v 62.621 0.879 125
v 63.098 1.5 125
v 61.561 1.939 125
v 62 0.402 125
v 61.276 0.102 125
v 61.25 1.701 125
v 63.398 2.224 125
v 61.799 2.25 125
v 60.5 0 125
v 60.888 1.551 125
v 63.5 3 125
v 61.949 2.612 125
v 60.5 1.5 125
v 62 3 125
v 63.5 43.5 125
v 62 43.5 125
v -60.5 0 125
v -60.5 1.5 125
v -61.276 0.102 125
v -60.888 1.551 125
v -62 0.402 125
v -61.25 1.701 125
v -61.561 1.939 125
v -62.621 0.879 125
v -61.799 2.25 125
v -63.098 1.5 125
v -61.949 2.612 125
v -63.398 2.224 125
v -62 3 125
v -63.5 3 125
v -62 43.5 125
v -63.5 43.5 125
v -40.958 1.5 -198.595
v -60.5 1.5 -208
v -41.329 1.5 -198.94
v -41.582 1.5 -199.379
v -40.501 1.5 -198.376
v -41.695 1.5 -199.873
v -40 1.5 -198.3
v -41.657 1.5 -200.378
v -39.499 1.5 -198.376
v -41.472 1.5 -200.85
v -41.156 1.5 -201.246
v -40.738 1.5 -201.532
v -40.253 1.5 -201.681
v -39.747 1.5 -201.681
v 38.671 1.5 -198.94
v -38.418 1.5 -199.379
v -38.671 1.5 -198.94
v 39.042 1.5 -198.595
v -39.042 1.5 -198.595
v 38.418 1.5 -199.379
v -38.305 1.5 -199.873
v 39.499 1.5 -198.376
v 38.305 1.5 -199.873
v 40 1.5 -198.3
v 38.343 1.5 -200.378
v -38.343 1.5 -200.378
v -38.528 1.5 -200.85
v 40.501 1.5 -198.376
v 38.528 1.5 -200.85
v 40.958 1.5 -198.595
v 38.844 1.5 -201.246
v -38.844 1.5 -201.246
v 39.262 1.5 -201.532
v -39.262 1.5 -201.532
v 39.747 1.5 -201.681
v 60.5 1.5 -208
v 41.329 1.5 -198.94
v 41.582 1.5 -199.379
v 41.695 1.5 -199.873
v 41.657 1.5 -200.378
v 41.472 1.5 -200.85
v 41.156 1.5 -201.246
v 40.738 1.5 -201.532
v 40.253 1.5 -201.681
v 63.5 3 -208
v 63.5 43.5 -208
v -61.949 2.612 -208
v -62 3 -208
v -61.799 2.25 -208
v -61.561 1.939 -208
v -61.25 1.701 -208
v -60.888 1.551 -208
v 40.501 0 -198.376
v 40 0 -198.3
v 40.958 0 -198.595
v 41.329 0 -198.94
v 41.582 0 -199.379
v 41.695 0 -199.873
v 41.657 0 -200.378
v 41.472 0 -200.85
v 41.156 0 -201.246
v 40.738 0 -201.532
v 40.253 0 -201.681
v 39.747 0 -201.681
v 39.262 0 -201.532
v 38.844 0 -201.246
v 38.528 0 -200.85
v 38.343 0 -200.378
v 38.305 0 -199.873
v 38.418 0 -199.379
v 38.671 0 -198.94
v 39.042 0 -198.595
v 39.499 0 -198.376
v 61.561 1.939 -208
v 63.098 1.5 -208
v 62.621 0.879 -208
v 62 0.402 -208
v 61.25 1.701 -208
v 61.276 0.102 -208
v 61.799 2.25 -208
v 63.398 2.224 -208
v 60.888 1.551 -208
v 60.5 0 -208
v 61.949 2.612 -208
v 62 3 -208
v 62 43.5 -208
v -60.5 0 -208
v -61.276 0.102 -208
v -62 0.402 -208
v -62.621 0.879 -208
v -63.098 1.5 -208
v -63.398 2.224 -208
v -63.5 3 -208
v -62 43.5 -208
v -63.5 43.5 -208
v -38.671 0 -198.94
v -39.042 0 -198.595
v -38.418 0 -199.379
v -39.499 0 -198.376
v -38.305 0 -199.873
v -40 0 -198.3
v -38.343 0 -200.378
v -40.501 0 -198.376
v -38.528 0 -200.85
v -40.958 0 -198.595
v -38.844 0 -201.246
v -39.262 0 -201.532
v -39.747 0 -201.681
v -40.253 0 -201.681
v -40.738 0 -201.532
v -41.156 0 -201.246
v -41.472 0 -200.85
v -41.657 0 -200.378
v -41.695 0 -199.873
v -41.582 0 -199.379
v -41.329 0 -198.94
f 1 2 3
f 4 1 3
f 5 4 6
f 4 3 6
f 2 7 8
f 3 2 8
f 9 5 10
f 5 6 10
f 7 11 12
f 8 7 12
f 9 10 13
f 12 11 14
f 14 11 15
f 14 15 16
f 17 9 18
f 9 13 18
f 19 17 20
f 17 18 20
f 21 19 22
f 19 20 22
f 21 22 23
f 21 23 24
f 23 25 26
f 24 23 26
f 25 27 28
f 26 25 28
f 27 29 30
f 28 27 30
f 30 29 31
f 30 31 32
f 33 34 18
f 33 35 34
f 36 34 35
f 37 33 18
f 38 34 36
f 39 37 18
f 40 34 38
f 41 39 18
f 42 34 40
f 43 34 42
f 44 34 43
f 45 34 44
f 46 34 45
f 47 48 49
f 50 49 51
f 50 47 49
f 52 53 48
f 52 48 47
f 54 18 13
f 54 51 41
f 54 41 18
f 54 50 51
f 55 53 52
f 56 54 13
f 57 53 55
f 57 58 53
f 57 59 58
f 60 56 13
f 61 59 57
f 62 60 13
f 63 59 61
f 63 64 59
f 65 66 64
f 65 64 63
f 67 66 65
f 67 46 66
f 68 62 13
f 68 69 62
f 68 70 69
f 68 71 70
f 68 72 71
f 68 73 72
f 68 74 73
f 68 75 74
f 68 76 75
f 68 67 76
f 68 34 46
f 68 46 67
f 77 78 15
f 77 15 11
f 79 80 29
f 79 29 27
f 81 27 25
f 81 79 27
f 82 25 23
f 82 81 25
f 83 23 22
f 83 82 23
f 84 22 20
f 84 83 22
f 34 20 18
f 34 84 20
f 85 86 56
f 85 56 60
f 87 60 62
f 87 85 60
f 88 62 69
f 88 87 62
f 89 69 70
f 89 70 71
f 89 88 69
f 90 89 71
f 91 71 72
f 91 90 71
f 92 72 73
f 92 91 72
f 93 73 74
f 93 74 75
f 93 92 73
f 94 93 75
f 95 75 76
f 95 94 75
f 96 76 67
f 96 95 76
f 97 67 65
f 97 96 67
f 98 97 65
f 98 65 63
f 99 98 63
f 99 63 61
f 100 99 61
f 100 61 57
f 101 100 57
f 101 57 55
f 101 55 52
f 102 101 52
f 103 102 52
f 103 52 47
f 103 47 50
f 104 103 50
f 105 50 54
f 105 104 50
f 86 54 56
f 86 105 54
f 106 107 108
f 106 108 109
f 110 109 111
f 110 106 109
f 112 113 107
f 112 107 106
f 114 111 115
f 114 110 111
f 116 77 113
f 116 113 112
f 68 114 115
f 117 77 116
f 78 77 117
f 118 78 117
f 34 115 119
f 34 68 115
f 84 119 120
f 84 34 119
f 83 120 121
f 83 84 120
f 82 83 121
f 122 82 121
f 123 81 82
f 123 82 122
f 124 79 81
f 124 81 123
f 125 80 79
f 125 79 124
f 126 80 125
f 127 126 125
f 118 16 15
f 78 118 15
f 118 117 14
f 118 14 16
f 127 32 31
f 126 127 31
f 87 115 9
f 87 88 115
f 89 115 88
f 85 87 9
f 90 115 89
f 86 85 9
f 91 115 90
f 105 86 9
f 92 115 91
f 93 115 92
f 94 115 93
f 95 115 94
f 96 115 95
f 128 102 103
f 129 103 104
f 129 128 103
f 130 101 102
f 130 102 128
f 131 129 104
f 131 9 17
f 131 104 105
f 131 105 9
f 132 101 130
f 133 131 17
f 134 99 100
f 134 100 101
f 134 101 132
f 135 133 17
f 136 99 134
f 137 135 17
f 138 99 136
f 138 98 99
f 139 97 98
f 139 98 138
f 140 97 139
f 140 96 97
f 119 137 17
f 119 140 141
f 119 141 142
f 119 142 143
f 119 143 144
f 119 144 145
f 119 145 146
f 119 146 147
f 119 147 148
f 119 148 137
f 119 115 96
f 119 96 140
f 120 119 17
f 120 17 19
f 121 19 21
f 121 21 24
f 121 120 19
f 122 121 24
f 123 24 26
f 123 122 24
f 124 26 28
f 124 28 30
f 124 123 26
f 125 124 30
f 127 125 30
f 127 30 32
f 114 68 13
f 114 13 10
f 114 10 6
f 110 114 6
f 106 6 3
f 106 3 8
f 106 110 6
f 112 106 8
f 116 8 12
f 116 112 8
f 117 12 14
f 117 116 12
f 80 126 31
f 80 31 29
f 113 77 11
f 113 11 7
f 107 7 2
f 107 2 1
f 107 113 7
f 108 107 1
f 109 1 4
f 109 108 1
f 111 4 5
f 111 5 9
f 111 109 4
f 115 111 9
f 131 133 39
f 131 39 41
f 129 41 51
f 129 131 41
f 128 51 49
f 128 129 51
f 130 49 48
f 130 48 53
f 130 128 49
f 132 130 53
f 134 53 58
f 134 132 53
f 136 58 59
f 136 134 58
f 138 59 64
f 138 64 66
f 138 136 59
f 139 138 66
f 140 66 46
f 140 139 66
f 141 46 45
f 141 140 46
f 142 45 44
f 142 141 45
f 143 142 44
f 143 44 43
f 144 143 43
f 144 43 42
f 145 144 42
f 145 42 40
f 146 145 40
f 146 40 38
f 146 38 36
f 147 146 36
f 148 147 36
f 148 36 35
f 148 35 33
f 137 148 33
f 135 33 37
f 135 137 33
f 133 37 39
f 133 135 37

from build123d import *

# Parameters (mm, degrees)
SM_TRAY_DEPTH       = 333
SK_FACEHOLES_R      = 1.7
CUT_FACEHOLES_DEPTH = 1.5


# Sheet-metal steps are written as plain solids
with BuildPart() as part:
    # SK_Tray → SM_Tray (new body)
    with BuildSketch(Plane.XY.offset(-208)):
        with BuildLine():
            Line((-62, 43.5), (-62, 3))
            ThreePointArc((-62, 3), (-61.560660172, 1.939339828), (-60.5, 1.5))
            Line((-60.5, 1.5), (60.5, 1.5))
            ThreePointArc((60.5, 1.5), (61.560660172, 1.939339828), (62, 3))
            Line((62, 3), (62, 43.5))
            Line((62, 43.5), (63.5, 43.5))
            Line((63.5, 43.5), (63.5, 3))
            ThreePointArc((63.5, 3), (62.621320344, 0.878679656), (60.5, 0))
            Line((60.5, 0), (-60.5, 0))
            ThreePointArc((-60.5, 0), (-62.621320344, 0.878679656), (-63.5, 3))
            Line((-63.5, 3), (-63.5, 43.5))
            Line((-63.5, 43.5), (-62, 43.5))
        make_face()
    extrude(amount=SM_TRAY_DEPTH)

    # SK_FaceHoles → CUT_FaceHoles (cut)
    with BuildSketch(Plane(origin=(0, 0, 0), x_dir=(1, 0, 0), z_dir=(0, 1, 0))):
        with Locations(Location((40, 200, 0), (0, 0, 270))):
            Circle(SK_FACEHOLES_R)
        with Locations(Location((-40, 200, 0), (0, 0, 270))):
            Circle(SK_FACEHOLES_R)
    extrude(amount=CUT_FACEHOLES_DEPTH, mode=Mode.SUBTRACT)


solid = part.part
